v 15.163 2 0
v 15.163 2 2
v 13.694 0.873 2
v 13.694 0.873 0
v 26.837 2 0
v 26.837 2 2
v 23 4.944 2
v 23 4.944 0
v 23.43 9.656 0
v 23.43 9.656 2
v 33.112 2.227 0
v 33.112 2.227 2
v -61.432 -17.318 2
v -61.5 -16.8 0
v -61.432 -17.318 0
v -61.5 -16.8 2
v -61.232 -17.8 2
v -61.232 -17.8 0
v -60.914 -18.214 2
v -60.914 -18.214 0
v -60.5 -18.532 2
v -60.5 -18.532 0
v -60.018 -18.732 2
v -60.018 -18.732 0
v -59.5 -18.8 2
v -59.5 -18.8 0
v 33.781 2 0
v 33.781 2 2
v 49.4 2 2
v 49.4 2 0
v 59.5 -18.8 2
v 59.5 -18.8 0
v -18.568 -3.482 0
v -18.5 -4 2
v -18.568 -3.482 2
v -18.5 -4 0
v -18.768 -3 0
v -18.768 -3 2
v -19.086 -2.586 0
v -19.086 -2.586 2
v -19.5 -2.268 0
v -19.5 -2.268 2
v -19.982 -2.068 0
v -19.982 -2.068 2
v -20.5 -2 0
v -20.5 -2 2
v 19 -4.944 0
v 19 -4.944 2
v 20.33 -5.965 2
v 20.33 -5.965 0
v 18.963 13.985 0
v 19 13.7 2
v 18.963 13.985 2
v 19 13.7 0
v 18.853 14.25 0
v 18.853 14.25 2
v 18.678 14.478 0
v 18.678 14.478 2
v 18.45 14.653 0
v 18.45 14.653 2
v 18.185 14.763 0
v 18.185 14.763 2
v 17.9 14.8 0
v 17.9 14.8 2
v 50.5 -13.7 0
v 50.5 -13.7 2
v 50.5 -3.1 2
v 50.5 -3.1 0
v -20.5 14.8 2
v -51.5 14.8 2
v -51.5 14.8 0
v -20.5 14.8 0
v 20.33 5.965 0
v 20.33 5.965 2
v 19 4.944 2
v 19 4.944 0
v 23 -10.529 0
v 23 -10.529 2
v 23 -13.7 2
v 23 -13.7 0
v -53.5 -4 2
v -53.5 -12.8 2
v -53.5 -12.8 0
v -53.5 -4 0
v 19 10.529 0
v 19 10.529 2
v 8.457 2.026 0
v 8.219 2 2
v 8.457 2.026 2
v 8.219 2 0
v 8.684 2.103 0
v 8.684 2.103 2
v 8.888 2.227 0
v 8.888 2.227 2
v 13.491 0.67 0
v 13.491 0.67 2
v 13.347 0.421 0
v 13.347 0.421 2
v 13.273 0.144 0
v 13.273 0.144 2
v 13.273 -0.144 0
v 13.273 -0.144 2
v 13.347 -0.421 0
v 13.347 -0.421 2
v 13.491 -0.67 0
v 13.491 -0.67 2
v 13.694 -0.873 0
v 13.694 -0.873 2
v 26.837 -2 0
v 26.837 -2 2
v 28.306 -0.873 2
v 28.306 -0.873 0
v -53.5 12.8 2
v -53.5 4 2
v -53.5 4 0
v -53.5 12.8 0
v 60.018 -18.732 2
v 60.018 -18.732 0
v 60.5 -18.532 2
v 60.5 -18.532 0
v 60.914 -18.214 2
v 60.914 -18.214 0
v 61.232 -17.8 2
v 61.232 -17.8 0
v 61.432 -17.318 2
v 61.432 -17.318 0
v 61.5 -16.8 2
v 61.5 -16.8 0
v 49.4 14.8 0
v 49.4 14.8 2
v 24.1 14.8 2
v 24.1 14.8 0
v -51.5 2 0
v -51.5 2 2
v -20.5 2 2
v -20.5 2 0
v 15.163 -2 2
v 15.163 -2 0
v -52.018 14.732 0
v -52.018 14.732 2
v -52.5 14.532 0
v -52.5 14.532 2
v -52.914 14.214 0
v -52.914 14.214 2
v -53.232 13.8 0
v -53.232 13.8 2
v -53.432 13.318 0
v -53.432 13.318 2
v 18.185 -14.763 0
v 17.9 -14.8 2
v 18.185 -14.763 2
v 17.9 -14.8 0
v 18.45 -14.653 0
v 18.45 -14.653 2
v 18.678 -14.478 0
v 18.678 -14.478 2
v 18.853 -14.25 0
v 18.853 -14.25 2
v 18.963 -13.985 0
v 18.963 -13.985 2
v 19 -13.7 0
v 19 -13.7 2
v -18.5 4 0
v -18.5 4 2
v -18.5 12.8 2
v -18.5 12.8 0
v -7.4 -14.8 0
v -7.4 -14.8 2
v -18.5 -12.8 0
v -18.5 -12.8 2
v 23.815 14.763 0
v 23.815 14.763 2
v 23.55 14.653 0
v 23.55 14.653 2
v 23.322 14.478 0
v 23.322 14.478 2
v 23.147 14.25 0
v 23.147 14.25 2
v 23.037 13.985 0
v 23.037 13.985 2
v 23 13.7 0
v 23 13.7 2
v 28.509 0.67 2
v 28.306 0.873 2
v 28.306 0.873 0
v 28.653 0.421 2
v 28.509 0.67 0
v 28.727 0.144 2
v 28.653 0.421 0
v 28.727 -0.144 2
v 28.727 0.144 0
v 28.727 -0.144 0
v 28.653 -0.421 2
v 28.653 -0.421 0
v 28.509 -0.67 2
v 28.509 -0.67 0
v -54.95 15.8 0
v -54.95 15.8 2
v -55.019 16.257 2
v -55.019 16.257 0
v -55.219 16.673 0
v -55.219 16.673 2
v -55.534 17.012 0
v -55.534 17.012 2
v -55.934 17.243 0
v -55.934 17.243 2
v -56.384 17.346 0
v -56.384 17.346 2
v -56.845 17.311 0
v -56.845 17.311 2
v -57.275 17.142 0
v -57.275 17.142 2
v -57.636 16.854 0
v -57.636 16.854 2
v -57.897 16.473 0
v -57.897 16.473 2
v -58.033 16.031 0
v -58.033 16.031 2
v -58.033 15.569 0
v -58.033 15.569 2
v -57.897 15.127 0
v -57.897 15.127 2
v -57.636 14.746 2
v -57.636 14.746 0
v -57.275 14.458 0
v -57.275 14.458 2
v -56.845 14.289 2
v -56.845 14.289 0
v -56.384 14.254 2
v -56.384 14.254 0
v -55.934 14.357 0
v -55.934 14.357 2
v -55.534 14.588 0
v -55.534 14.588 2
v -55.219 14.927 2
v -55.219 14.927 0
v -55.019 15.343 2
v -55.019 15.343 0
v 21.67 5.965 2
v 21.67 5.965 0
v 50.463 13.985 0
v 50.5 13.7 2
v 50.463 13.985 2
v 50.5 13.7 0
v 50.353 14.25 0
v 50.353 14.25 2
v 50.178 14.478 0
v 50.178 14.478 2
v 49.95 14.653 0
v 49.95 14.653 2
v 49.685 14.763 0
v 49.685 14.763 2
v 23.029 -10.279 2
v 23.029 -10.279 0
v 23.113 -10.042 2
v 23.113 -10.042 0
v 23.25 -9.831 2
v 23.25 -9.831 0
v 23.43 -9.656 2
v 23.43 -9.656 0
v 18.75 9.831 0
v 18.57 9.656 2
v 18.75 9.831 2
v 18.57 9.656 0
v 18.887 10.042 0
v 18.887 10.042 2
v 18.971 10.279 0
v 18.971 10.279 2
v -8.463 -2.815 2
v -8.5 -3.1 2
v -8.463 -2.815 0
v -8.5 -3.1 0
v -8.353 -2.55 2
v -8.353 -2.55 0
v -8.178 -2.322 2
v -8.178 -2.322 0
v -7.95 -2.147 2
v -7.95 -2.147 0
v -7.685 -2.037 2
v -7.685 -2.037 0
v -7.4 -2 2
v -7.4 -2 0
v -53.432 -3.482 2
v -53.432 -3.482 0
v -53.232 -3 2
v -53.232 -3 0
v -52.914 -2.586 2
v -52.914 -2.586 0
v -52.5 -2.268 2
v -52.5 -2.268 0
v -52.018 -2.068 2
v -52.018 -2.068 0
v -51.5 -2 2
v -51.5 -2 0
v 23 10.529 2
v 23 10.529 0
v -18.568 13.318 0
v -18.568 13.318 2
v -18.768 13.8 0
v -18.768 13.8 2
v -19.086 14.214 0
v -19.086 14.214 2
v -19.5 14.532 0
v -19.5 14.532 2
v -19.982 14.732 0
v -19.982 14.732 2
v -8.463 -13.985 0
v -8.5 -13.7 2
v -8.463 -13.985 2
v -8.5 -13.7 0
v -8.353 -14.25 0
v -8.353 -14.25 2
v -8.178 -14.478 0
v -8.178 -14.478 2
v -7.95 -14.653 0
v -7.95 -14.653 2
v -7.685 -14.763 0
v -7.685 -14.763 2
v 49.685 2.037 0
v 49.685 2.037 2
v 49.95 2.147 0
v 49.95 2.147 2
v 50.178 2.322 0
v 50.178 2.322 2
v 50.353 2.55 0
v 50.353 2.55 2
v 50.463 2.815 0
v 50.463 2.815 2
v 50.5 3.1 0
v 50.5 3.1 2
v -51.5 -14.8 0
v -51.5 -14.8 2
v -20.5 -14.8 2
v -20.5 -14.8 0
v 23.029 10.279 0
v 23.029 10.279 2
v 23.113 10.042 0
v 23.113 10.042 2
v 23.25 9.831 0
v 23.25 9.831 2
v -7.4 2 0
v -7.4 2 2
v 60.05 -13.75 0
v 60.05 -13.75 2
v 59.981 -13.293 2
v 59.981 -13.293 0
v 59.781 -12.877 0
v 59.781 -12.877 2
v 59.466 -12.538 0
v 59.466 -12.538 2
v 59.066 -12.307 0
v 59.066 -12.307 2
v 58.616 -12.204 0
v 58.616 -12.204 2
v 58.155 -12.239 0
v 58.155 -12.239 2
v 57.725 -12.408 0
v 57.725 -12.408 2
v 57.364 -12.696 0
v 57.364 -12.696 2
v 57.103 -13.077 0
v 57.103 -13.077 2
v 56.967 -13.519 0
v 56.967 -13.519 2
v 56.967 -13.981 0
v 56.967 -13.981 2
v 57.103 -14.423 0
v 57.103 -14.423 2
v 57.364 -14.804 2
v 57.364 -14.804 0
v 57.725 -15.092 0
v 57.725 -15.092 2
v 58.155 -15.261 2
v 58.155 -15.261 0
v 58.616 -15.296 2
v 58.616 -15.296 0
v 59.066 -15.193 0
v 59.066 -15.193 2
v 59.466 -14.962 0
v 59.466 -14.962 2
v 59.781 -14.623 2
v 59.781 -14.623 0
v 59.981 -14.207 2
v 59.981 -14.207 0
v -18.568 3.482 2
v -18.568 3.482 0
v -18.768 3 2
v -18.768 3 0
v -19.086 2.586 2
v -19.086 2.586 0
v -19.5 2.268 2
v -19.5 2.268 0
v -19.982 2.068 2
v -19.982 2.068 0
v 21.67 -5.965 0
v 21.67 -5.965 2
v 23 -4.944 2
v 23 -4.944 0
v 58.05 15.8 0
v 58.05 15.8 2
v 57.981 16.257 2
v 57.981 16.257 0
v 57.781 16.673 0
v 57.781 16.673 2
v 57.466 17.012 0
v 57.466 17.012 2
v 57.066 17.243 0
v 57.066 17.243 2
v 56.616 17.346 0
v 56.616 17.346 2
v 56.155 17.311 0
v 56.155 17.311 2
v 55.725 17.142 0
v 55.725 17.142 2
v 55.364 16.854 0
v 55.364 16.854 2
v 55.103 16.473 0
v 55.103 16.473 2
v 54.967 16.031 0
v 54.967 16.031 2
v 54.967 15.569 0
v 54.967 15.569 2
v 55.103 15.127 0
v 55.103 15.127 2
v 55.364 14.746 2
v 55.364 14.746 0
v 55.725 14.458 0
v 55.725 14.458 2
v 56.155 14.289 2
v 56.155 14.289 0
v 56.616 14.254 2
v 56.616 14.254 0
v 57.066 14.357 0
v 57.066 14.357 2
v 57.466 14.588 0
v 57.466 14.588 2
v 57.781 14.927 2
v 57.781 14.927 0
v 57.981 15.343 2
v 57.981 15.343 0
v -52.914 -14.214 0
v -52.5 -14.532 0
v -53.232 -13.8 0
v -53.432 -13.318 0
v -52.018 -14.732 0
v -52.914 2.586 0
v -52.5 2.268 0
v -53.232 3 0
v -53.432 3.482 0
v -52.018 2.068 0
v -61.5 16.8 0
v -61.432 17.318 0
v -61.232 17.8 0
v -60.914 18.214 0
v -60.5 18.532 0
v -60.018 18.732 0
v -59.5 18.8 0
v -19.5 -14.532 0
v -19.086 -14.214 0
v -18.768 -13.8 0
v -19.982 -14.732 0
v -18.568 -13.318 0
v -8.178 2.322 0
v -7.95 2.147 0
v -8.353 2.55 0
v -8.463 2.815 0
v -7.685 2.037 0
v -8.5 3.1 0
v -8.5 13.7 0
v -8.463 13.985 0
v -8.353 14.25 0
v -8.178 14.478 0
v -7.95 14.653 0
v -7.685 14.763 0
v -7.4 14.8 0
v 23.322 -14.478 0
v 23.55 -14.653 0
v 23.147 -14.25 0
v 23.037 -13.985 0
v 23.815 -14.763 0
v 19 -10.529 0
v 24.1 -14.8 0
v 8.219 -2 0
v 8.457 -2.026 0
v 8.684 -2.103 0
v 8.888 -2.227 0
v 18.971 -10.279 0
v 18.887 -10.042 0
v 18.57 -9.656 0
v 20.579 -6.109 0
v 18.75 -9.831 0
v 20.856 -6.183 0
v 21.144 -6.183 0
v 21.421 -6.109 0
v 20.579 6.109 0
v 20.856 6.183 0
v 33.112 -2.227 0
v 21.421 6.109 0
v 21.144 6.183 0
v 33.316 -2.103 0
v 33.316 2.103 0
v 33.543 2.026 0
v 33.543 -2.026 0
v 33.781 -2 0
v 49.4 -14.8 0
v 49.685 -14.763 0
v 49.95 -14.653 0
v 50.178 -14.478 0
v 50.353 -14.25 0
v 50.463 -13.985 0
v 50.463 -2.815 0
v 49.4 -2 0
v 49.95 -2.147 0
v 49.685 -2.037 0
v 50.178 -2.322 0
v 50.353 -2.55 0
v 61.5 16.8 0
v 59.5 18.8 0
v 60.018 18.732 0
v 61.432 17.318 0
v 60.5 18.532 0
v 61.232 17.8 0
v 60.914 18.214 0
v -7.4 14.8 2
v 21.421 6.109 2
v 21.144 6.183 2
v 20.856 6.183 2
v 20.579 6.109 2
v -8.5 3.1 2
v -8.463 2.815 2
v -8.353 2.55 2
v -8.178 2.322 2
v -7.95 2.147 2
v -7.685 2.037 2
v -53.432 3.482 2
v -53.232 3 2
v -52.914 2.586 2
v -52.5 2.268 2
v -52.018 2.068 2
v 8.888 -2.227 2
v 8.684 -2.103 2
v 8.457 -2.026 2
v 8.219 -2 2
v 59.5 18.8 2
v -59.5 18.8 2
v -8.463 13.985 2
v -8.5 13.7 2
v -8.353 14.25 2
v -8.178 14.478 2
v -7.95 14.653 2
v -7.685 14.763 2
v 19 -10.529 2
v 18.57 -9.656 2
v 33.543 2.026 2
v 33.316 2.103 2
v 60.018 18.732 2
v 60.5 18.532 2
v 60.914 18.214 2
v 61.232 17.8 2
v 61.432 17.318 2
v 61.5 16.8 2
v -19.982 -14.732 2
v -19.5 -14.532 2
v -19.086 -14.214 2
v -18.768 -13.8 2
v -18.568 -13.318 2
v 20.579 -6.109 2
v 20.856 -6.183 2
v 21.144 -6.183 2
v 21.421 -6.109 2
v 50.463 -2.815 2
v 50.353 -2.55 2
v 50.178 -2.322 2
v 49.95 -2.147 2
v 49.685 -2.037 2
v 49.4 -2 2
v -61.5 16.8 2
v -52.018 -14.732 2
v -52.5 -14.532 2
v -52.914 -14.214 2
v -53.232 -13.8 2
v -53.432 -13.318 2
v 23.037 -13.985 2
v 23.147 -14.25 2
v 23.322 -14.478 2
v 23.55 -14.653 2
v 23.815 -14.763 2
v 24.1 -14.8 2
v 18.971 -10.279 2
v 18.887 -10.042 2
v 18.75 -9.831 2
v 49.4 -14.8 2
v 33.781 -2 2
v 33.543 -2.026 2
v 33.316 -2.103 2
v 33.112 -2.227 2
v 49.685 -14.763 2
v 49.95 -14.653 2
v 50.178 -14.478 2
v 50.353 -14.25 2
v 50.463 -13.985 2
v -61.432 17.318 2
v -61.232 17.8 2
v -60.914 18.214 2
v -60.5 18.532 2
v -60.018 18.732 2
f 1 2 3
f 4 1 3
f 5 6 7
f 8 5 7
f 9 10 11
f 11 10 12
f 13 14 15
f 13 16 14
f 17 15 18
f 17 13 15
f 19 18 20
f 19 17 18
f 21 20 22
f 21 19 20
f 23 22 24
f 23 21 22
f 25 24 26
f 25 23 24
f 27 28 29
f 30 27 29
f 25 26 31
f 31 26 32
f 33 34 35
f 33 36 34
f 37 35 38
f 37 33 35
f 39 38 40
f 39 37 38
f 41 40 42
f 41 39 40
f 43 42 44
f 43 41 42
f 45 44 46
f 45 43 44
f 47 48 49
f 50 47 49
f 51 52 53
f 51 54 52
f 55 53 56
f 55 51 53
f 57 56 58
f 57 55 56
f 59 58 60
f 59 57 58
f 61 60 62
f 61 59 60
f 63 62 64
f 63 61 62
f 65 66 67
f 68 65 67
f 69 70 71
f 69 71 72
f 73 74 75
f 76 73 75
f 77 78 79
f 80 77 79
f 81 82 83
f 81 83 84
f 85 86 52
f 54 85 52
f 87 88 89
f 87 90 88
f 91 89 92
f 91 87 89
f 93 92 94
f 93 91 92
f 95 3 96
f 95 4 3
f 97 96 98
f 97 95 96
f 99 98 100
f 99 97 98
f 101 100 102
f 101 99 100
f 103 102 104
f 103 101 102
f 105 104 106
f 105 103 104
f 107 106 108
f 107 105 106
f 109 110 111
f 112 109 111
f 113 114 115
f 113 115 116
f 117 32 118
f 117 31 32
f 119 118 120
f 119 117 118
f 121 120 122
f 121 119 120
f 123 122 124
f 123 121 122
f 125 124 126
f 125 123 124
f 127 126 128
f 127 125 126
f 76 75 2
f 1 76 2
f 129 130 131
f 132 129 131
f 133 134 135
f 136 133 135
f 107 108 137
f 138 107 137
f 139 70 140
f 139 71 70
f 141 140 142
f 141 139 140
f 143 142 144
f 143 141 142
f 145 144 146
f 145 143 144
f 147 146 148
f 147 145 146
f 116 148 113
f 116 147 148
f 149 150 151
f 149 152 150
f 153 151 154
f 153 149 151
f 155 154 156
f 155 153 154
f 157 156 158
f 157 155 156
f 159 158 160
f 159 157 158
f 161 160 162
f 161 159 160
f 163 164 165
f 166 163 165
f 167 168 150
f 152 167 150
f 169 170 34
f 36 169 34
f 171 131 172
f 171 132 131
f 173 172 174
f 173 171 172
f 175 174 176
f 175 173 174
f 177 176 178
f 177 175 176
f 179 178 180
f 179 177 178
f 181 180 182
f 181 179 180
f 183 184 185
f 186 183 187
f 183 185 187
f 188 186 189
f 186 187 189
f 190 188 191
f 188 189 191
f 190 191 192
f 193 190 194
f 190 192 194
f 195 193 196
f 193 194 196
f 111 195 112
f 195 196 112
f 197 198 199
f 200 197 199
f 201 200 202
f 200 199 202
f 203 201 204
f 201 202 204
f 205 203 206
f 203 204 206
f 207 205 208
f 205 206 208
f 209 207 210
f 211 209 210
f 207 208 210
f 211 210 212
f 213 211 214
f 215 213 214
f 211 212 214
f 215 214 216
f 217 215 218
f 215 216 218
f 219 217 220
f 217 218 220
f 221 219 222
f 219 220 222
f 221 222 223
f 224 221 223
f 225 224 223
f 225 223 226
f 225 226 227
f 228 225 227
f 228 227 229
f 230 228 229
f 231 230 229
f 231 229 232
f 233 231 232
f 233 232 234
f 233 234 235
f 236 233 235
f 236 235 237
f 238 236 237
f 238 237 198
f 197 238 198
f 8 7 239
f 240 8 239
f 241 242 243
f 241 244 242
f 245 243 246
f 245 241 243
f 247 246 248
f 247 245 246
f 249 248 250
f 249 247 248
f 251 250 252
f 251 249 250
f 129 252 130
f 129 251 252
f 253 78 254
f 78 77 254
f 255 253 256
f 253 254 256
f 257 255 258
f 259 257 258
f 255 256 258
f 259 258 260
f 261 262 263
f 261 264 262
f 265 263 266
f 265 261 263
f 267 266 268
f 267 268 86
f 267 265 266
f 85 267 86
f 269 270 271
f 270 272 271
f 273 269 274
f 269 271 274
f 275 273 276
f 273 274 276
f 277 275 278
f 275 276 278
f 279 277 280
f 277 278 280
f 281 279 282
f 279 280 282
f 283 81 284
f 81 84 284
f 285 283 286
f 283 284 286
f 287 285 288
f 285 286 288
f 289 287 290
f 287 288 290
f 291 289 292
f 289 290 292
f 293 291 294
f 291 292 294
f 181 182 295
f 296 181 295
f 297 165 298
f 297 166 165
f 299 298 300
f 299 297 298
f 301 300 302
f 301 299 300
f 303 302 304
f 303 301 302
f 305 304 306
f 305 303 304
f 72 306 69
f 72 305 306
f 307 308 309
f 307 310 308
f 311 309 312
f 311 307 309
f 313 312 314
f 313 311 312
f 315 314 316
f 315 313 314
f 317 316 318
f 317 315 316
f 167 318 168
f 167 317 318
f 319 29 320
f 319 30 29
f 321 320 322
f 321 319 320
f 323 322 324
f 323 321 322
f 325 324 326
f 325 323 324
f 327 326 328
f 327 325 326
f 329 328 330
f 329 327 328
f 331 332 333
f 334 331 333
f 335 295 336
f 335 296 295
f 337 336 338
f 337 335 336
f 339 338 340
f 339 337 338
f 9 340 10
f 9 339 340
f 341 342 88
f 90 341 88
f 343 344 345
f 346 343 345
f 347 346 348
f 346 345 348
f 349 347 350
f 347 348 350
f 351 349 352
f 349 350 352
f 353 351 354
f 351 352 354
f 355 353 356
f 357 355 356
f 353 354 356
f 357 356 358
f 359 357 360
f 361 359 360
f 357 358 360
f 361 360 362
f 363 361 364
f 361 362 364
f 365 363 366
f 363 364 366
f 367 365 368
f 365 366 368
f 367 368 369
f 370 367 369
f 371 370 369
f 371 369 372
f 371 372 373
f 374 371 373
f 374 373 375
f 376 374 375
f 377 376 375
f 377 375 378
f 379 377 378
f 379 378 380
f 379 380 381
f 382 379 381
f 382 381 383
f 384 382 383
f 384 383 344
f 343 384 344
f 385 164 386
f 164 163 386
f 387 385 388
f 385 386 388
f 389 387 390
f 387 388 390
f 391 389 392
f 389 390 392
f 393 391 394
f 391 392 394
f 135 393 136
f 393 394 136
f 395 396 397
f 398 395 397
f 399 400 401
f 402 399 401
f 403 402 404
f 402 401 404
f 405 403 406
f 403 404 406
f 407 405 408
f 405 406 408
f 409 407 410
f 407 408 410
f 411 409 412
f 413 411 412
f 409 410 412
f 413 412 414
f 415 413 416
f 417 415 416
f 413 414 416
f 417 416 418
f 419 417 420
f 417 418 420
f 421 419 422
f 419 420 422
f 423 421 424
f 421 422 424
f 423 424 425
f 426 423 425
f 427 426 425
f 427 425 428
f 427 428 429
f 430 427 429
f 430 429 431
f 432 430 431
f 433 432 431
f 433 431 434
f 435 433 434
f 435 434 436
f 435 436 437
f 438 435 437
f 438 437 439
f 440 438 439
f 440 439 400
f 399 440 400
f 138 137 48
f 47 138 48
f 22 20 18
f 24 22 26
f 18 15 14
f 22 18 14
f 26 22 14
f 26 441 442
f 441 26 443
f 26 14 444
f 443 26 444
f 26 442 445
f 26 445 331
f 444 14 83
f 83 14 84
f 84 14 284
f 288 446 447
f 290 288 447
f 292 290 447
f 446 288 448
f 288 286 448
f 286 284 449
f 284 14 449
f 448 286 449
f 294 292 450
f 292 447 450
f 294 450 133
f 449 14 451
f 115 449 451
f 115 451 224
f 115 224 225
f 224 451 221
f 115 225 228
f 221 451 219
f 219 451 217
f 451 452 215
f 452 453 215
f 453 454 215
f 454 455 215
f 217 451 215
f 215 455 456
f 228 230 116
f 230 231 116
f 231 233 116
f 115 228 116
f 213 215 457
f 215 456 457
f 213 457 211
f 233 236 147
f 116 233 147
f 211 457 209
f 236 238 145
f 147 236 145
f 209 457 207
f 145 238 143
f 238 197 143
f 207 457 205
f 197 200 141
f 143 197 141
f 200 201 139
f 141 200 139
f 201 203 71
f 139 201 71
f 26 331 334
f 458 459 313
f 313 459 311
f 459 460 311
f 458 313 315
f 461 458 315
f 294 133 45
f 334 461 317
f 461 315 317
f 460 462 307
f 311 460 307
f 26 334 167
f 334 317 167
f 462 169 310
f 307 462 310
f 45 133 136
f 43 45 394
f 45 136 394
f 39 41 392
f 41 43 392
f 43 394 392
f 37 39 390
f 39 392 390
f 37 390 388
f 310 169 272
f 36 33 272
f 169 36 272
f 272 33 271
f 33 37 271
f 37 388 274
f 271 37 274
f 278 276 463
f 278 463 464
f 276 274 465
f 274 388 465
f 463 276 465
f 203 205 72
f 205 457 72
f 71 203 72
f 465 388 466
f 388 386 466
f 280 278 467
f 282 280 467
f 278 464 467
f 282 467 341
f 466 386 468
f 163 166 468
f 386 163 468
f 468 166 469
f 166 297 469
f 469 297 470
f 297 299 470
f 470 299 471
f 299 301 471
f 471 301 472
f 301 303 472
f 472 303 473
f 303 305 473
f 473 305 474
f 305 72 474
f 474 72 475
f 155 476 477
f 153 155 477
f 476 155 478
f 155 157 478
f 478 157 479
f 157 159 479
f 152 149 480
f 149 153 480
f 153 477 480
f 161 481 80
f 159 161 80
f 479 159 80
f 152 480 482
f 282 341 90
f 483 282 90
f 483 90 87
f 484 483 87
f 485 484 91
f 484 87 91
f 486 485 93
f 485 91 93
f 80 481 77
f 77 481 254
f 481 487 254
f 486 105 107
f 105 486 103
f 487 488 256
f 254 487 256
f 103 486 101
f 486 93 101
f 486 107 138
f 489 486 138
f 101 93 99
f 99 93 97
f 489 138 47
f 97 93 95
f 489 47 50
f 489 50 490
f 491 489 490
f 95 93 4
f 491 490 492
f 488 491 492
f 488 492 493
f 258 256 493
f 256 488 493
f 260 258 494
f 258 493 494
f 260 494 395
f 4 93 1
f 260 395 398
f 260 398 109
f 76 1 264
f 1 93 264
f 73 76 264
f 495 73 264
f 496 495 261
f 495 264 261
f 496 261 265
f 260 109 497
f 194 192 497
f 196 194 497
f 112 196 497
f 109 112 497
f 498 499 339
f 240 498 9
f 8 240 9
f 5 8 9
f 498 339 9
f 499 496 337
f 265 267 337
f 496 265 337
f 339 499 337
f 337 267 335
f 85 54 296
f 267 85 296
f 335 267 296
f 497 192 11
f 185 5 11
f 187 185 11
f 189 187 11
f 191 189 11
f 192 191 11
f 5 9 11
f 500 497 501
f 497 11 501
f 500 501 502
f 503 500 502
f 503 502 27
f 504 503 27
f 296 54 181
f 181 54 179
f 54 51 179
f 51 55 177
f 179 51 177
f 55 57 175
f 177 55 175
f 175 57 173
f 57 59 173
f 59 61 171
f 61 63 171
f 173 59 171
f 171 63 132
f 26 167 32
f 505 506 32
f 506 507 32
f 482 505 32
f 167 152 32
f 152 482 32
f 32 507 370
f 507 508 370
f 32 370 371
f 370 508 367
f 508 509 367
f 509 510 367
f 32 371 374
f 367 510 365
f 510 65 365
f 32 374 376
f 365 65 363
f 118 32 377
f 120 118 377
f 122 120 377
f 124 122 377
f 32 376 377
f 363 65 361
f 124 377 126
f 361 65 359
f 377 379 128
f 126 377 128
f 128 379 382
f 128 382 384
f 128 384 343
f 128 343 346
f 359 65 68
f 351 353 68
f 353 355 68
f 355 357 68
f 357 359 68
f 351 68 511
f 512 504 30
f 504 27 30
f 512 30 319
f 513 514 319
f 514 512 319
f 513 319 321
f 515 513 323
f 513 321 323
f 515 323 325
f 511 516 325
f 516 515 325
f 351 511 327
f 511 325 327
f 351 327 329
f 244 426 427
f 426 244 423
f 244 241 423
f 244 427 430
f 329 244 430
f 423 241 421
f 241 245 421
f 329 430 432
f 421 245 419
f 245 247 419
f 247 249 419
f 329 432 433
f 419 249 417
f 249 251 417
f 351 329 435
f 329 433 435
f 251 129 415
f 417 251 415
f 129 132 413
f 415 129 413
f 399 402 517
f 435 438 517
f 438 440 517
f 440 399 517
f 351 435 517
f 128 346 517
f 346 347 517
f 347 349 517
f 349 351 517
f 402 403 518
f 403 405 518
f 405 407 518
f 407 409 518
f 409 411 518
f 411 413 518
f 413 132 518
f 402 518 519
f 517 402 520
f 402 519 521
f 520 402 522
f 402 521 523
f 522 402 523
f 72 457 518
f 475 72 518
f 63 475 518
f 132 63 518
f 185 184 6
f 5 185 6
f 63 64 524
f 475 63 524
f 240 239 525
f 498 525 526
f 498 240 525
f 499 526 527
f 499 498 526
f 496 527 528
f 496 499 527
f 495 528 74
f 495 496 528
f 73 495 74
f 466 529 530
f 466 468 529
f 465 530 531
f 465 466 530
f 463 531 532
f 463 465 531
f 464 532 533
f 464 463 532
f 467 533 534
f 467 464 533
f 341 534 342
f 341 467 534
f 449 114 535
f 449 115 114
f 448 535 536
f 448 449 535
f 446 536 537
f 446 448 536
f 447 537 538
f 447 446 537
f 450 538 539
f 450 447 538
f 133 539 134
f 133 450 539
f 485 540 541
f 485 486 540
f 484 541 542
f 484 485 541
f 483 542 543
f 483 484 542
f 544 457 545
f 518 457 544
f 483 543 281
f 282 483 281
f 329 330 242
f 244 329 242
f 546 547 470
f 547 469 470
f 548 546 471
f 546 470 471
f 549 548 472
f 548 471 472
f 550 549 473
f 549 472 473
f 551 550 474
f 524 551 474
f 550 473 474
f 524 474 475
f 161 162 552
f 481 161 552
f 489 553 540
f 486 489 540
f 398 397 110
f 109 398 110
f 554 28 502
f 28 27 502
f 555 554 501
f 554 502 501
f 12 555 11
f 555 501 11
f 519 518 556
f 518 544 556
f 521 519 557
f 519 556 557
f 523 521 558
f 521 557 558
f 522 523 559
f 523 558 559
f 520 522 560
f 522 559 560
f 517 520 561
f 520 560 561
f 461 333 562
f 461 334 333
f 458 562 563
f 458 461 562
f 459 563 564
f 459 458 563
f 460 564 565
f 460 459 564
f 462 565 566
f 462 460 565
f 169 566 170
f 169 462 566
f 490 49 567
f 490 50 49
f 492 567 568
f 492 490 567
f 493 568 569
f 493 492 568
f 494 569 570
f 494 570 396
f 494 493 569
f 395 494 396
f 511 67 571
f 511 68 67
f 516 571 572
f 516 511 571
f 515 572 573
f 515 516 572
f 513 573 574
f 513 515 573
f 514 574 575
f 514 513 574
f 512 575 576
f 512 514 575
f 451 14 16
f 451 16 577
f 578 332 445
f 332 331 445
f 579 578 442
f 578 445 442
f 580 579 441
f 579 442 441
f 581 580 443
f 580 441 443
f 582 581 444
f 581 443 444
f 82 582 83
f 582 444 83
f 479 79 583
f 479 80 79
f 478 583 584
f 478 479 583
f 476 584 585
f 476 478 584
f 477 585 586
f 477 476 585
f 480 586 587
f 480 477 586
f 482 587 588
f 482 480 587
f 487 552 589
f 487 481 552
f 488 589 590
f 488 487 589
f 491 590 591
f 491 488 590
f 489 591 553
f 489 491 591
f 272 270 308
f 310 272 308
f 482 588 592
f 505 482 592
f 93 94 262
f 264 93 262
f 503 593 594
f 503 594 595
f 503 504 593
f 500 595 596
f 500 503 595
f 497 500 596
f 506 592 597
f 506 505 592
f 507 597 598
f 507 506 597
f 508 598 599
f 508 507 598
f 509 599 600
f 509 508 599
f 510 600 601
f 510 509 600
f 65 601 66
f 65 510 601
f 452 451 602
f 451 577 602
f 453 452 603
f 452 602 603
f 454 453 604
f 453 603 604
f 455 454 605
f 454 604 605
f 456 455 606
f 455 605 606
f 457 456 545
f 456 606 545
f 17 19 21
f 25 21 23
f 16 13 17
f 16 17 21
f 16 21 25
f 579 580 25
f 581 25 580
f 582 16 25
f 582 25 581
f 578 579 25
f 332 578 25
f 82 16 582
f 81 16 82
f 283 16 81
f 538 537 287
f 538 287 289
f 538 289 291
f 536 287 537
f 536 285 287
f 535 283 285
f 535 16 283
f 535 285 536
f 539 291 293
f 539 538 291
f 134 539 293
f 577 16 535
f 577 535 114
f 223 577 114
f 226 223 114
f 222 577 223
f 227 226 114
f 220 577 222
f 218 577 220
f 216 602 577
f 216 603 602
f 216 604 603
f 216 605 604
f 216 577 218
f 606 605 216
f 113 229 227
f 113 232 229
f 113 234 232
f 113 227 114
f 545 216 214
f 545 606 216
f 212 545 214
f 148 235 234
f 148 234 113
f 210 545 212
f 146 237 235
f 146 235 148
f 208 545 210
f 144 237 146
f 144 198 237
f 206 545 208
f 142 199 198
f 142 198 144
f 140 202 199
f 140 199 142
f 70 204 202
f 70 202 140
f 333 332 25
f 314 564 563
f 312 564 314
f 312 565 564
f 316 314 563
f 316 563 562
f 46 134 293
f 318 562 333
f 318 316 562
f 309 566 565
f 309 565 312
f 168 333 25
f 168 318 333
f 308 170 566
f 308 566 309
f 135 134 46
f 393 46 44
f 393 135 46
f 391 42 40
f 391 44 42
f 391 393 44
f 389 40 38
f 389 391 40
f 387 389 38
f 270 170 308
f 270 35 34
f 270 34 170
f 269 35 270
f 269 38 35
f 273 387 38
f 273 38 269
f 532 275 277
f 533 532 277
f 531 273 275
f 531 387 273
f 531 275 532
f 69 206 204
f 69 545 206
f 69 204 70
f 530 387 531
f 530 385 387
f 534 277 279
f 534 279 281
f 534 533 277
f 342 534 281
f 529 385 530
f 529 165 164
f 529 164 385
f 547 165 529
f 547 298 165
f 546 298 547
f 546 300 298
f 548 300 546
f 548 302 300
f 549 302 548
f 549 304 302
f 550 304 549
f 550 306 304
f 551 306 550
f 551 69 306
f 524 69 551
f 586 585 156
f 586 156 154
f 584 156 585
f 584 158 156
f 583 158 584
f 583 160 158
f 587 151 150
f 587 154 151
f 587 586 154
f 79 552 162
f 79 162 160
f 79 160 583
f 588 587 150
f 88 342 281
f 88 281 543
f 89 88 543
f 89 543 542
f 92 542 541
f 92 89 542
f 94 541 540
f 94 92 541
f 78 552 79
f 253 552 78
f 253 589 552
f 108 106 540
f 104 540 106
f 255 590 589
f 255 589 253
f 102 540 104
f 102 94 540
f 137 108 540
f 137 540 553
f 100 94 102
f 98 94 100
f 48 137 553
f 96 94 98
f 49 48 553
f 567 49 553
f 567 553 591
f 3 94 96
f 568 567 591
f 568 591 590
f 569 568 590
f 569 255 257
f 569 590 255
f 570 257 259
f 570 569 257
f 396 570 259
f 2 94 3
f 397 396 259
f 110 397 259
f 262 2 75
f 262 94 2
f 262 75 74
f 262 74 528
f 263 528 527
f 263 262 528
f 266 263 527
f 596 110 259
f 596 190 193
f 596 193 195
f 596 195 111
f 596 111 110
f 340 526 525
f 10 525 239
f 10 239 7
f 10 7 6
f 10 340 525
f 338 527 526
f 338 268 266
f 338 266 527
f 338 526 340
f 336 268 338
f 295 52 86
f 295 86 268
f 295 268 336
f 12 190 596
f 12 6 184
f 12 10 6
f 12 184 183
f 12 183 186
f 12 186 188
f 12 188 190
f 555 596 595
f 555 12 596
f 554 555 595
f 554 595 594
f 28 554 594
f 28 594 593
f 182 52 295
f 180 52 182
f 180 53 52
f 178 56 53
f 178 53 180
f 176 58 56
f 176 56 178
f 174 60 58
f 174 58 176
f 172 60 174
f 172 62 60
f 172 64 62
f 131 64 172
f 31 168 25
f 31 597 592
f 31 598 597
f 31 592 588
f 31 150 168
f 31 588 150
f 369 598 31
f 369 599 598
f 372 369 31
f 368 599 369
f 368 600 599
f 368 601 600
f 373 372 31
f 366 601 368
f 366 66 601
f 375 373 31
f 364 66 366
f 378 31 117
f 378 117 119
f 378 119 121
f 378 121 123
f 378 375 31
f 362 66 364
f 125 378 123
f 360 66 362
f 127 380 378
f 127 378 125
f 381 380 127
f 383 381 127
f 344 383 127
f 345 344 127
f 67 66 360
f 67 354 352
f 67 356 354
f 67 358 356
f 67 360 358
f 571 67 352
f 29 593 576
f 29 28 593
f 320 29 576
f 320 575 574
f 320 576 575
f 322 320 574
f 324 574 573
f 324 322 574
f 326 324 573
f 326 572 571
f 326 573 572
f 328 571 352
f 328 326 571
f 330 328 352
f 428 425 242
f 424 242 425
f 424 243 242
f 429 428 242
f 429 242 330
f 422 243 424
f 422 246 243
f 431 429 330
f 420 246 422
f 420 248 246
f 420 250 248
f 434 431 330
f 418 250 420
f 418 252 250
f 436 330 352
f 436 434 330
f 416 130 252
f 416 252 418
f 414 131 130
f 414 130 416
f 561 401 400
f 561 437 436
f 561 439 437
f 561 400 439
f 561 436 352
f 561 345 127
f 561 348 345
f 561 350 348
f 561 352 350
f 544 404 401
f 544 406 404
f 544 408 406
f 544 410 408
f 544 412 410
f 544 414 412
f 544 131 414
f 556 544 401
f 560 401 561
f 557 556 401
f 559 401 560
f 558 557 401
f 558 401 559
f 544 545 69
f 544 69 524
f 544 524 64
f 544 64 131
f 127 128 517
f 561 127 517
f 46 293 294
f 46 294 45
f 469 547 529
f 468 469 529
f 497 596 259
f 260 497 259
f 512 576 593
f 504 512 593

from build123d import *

# Parameters (mm, degrees)
SKETCH_1_W          = 123
SKETCH_1_H          = 37.6
EXTRUDE_1_DEPTH     = 2
SKETCH_2_R          = 1.55
CUT_EXTRUDE_1_DEPTH = 10
SKETCH_3_W          = 35
SKETCH_3_H          = 29.6
CUT_EXTRUDE_2_DEPTH = 10
FILLET_1_R          = 2
SKETCH_4_W          = 4
SKETCH_4_H          = 4
CUT_EXTRUDE_3_DEPTH = 10
FILLET_2_R          = 1.1
SKETCH_5_W          = 35
SKETCH_5_H          = 4
EXTRUDE_1_2_DEPTH   = 2
FILLET_3_R          = 2


with BuildPart() as part:
    # 草图1 → Extrude 1 (new body)
    with BuildSketch(Plane.XY):
        Rectangle(SKETCH_1_W, SKETCH_1_H)
    extrude(amount=EXTRUDE_1_DEPTH)

    # 草图2 → 切除-拉伸1 (cut)
    with BuildSketch(Plane.XY.offset(2)):
        with Locations((56.5, 15.8)):
            Circle(SKETCH_2_R)
        with Locations((58.5, -13.75)):
            Circle(SKETCH_2_R)
        with Locations((-56.5, 15.8)):
            Circle(SKETCH_2_R)
    extrude(amount=-CUT_EXTRUDE_1_DEPTH, mode=Mode.SUBTRACT)

    # 草图3 → 切除-拉伸2 (cut)
    with BuildSketch(Plane.XY.offset(2)):
        with Locations((-36, 0)):
            Rectangle(SKETCH_3_W, SKETCH_3_H)
    extrude(amount=-CUT_EXTRUDE_2_DEPTH, mode=Mode.SUBTRACT)

    # 圆角1
    fillet_1_edges = [part.edges().sort_by_distance(p)[0] for p in [
        (-18.5, 14.8, 1),
        (-18.5, -14.8, 1),
        (-53.5, -14.8, 1),
        (-53.5, 14.8, 1),
        (61.5, -18.8, 1),
        (-61.5, -18.8, 1),
        (-61.5, 18.8, 1),
        (61.5, 18.8, 1),
    ]]
    fillet(fillet_1_edges, radius=FILLET_1_R)

    # 草图4 → 切除-拉伸3 (cut)
    with BuildSketch(Plane.XY.offset(2)):
        Polygon((23, -9.986290852), (23, -14.8), (50.5, -14.8), (50.5, -2), (33.407936873, -2), align=None)
        Polygon((33.407936873, 2), (50.5, 2), (50.5, 14.8), (23, 14.8), (23, 9.986290852), align=None)
        Polygon((-8.5, 14.8), (-8.5, 2), (8.592063127, 2), (19, 9.986290852), (19, 14.8), align=None)
        Polygon((-8.5, -2), (-8.5, -14.8), (19, -14.8), (19, -9.986290852), (8.592063127, -2), align=None)
        Polygon((23, -2), (26.837218346, -2), (29.443669092, 0), (26.837218346, 2), (23, 2), align=None)
        Polygon((23, -2), (23, -4.944401196), (26.837218346, -2), align=None)
        Polygon((19, -2), (19, -4.944401196), (21, -6.479055172), (23, -4.944401196), (23, -2), align=None)
        Polygon((15.162781654, -2), (19, -4.944401196), (19, -2), align=None)
        Polygon((12.556330908, 0), (15.162781654, -2), (19, -2), (19, 2), (15.162781654, 2), align=None)
        Polygon((19, 4.944401196), (15.162781654, 2), (19, 2), align=None)
        Polygon((19, 4.944401196), (19, 2), (23, 2), (23, 4.944401196), (21, 6.479055172), align=None)
        Polygon((23, 4.944401196), (23, 2), (26.837218346, 2), align=None)
        with Locations((21, 0)):
            Rectangle(SKETCH_4_W, SKETCH_4_H)
    extrude(amount=-CUT_EXTRUDE_3_DEPTH, mode=Mode.SUBTRACT)

    # 圆角2
    fillet_2_edges = [part.edges().sort_by_distance(p)[0] for p in [
        (33.407936873, 2, 1),
        (23, 9.986290852, 1),
        (23, 14.8, 1),
        (50.5, 14.8, 1),
        (50.5, 2, 1),
        (-8.5, 2, 1),
        (-8.5, 14.8, 1),
        (19, 14.8, 1),
        (19, 9.986290852, 1),
        (8.592063127, 2, 1),
        (21, 6.479055172, 1),
        (29.443669092, 0, 1),
        (21, -6.479055172, 1),
        (12.556330908, 0, 1),
        (-8.5, -2, 1),
        (8.592063127, -2, 1),
        (19, -9.986290852, 1),
        (19, -14.8, 1),
        (-8.5, -14.8, 1),
        (23, -9.986290852, 1),
        (33.407936873, -2, 1),
        (50.5, -2, 1),
        (50.5, -14.8, 1),
        (23, -14.8, 1),
    ]]
    fillet(fillet_2_edges, radius=FILLET_2_R)

    # 草图5 → Extrude 1 2 (add)
    with BuildSketch(Plane.XY.offset(2)):
        with Locations((-36, 0)):
            Rectangle(SKETCH_5_W, SKETCH_5_H)
    extrude(amount=-EXTRUDE_1_2_DEPTH)

    # 圆角3
    fillet_3_edges = [part.edges().sort_by_distance(p)[0] for p in [
        (-53.5, 2, 1),
        (-18.5, 2, 1),
        (-18.5, -2, 1),
        (-53.5, -2, 1),
    ]]
    fillet(fillet_3_edges, radius=FILLET_3_R)


solid = part.part
